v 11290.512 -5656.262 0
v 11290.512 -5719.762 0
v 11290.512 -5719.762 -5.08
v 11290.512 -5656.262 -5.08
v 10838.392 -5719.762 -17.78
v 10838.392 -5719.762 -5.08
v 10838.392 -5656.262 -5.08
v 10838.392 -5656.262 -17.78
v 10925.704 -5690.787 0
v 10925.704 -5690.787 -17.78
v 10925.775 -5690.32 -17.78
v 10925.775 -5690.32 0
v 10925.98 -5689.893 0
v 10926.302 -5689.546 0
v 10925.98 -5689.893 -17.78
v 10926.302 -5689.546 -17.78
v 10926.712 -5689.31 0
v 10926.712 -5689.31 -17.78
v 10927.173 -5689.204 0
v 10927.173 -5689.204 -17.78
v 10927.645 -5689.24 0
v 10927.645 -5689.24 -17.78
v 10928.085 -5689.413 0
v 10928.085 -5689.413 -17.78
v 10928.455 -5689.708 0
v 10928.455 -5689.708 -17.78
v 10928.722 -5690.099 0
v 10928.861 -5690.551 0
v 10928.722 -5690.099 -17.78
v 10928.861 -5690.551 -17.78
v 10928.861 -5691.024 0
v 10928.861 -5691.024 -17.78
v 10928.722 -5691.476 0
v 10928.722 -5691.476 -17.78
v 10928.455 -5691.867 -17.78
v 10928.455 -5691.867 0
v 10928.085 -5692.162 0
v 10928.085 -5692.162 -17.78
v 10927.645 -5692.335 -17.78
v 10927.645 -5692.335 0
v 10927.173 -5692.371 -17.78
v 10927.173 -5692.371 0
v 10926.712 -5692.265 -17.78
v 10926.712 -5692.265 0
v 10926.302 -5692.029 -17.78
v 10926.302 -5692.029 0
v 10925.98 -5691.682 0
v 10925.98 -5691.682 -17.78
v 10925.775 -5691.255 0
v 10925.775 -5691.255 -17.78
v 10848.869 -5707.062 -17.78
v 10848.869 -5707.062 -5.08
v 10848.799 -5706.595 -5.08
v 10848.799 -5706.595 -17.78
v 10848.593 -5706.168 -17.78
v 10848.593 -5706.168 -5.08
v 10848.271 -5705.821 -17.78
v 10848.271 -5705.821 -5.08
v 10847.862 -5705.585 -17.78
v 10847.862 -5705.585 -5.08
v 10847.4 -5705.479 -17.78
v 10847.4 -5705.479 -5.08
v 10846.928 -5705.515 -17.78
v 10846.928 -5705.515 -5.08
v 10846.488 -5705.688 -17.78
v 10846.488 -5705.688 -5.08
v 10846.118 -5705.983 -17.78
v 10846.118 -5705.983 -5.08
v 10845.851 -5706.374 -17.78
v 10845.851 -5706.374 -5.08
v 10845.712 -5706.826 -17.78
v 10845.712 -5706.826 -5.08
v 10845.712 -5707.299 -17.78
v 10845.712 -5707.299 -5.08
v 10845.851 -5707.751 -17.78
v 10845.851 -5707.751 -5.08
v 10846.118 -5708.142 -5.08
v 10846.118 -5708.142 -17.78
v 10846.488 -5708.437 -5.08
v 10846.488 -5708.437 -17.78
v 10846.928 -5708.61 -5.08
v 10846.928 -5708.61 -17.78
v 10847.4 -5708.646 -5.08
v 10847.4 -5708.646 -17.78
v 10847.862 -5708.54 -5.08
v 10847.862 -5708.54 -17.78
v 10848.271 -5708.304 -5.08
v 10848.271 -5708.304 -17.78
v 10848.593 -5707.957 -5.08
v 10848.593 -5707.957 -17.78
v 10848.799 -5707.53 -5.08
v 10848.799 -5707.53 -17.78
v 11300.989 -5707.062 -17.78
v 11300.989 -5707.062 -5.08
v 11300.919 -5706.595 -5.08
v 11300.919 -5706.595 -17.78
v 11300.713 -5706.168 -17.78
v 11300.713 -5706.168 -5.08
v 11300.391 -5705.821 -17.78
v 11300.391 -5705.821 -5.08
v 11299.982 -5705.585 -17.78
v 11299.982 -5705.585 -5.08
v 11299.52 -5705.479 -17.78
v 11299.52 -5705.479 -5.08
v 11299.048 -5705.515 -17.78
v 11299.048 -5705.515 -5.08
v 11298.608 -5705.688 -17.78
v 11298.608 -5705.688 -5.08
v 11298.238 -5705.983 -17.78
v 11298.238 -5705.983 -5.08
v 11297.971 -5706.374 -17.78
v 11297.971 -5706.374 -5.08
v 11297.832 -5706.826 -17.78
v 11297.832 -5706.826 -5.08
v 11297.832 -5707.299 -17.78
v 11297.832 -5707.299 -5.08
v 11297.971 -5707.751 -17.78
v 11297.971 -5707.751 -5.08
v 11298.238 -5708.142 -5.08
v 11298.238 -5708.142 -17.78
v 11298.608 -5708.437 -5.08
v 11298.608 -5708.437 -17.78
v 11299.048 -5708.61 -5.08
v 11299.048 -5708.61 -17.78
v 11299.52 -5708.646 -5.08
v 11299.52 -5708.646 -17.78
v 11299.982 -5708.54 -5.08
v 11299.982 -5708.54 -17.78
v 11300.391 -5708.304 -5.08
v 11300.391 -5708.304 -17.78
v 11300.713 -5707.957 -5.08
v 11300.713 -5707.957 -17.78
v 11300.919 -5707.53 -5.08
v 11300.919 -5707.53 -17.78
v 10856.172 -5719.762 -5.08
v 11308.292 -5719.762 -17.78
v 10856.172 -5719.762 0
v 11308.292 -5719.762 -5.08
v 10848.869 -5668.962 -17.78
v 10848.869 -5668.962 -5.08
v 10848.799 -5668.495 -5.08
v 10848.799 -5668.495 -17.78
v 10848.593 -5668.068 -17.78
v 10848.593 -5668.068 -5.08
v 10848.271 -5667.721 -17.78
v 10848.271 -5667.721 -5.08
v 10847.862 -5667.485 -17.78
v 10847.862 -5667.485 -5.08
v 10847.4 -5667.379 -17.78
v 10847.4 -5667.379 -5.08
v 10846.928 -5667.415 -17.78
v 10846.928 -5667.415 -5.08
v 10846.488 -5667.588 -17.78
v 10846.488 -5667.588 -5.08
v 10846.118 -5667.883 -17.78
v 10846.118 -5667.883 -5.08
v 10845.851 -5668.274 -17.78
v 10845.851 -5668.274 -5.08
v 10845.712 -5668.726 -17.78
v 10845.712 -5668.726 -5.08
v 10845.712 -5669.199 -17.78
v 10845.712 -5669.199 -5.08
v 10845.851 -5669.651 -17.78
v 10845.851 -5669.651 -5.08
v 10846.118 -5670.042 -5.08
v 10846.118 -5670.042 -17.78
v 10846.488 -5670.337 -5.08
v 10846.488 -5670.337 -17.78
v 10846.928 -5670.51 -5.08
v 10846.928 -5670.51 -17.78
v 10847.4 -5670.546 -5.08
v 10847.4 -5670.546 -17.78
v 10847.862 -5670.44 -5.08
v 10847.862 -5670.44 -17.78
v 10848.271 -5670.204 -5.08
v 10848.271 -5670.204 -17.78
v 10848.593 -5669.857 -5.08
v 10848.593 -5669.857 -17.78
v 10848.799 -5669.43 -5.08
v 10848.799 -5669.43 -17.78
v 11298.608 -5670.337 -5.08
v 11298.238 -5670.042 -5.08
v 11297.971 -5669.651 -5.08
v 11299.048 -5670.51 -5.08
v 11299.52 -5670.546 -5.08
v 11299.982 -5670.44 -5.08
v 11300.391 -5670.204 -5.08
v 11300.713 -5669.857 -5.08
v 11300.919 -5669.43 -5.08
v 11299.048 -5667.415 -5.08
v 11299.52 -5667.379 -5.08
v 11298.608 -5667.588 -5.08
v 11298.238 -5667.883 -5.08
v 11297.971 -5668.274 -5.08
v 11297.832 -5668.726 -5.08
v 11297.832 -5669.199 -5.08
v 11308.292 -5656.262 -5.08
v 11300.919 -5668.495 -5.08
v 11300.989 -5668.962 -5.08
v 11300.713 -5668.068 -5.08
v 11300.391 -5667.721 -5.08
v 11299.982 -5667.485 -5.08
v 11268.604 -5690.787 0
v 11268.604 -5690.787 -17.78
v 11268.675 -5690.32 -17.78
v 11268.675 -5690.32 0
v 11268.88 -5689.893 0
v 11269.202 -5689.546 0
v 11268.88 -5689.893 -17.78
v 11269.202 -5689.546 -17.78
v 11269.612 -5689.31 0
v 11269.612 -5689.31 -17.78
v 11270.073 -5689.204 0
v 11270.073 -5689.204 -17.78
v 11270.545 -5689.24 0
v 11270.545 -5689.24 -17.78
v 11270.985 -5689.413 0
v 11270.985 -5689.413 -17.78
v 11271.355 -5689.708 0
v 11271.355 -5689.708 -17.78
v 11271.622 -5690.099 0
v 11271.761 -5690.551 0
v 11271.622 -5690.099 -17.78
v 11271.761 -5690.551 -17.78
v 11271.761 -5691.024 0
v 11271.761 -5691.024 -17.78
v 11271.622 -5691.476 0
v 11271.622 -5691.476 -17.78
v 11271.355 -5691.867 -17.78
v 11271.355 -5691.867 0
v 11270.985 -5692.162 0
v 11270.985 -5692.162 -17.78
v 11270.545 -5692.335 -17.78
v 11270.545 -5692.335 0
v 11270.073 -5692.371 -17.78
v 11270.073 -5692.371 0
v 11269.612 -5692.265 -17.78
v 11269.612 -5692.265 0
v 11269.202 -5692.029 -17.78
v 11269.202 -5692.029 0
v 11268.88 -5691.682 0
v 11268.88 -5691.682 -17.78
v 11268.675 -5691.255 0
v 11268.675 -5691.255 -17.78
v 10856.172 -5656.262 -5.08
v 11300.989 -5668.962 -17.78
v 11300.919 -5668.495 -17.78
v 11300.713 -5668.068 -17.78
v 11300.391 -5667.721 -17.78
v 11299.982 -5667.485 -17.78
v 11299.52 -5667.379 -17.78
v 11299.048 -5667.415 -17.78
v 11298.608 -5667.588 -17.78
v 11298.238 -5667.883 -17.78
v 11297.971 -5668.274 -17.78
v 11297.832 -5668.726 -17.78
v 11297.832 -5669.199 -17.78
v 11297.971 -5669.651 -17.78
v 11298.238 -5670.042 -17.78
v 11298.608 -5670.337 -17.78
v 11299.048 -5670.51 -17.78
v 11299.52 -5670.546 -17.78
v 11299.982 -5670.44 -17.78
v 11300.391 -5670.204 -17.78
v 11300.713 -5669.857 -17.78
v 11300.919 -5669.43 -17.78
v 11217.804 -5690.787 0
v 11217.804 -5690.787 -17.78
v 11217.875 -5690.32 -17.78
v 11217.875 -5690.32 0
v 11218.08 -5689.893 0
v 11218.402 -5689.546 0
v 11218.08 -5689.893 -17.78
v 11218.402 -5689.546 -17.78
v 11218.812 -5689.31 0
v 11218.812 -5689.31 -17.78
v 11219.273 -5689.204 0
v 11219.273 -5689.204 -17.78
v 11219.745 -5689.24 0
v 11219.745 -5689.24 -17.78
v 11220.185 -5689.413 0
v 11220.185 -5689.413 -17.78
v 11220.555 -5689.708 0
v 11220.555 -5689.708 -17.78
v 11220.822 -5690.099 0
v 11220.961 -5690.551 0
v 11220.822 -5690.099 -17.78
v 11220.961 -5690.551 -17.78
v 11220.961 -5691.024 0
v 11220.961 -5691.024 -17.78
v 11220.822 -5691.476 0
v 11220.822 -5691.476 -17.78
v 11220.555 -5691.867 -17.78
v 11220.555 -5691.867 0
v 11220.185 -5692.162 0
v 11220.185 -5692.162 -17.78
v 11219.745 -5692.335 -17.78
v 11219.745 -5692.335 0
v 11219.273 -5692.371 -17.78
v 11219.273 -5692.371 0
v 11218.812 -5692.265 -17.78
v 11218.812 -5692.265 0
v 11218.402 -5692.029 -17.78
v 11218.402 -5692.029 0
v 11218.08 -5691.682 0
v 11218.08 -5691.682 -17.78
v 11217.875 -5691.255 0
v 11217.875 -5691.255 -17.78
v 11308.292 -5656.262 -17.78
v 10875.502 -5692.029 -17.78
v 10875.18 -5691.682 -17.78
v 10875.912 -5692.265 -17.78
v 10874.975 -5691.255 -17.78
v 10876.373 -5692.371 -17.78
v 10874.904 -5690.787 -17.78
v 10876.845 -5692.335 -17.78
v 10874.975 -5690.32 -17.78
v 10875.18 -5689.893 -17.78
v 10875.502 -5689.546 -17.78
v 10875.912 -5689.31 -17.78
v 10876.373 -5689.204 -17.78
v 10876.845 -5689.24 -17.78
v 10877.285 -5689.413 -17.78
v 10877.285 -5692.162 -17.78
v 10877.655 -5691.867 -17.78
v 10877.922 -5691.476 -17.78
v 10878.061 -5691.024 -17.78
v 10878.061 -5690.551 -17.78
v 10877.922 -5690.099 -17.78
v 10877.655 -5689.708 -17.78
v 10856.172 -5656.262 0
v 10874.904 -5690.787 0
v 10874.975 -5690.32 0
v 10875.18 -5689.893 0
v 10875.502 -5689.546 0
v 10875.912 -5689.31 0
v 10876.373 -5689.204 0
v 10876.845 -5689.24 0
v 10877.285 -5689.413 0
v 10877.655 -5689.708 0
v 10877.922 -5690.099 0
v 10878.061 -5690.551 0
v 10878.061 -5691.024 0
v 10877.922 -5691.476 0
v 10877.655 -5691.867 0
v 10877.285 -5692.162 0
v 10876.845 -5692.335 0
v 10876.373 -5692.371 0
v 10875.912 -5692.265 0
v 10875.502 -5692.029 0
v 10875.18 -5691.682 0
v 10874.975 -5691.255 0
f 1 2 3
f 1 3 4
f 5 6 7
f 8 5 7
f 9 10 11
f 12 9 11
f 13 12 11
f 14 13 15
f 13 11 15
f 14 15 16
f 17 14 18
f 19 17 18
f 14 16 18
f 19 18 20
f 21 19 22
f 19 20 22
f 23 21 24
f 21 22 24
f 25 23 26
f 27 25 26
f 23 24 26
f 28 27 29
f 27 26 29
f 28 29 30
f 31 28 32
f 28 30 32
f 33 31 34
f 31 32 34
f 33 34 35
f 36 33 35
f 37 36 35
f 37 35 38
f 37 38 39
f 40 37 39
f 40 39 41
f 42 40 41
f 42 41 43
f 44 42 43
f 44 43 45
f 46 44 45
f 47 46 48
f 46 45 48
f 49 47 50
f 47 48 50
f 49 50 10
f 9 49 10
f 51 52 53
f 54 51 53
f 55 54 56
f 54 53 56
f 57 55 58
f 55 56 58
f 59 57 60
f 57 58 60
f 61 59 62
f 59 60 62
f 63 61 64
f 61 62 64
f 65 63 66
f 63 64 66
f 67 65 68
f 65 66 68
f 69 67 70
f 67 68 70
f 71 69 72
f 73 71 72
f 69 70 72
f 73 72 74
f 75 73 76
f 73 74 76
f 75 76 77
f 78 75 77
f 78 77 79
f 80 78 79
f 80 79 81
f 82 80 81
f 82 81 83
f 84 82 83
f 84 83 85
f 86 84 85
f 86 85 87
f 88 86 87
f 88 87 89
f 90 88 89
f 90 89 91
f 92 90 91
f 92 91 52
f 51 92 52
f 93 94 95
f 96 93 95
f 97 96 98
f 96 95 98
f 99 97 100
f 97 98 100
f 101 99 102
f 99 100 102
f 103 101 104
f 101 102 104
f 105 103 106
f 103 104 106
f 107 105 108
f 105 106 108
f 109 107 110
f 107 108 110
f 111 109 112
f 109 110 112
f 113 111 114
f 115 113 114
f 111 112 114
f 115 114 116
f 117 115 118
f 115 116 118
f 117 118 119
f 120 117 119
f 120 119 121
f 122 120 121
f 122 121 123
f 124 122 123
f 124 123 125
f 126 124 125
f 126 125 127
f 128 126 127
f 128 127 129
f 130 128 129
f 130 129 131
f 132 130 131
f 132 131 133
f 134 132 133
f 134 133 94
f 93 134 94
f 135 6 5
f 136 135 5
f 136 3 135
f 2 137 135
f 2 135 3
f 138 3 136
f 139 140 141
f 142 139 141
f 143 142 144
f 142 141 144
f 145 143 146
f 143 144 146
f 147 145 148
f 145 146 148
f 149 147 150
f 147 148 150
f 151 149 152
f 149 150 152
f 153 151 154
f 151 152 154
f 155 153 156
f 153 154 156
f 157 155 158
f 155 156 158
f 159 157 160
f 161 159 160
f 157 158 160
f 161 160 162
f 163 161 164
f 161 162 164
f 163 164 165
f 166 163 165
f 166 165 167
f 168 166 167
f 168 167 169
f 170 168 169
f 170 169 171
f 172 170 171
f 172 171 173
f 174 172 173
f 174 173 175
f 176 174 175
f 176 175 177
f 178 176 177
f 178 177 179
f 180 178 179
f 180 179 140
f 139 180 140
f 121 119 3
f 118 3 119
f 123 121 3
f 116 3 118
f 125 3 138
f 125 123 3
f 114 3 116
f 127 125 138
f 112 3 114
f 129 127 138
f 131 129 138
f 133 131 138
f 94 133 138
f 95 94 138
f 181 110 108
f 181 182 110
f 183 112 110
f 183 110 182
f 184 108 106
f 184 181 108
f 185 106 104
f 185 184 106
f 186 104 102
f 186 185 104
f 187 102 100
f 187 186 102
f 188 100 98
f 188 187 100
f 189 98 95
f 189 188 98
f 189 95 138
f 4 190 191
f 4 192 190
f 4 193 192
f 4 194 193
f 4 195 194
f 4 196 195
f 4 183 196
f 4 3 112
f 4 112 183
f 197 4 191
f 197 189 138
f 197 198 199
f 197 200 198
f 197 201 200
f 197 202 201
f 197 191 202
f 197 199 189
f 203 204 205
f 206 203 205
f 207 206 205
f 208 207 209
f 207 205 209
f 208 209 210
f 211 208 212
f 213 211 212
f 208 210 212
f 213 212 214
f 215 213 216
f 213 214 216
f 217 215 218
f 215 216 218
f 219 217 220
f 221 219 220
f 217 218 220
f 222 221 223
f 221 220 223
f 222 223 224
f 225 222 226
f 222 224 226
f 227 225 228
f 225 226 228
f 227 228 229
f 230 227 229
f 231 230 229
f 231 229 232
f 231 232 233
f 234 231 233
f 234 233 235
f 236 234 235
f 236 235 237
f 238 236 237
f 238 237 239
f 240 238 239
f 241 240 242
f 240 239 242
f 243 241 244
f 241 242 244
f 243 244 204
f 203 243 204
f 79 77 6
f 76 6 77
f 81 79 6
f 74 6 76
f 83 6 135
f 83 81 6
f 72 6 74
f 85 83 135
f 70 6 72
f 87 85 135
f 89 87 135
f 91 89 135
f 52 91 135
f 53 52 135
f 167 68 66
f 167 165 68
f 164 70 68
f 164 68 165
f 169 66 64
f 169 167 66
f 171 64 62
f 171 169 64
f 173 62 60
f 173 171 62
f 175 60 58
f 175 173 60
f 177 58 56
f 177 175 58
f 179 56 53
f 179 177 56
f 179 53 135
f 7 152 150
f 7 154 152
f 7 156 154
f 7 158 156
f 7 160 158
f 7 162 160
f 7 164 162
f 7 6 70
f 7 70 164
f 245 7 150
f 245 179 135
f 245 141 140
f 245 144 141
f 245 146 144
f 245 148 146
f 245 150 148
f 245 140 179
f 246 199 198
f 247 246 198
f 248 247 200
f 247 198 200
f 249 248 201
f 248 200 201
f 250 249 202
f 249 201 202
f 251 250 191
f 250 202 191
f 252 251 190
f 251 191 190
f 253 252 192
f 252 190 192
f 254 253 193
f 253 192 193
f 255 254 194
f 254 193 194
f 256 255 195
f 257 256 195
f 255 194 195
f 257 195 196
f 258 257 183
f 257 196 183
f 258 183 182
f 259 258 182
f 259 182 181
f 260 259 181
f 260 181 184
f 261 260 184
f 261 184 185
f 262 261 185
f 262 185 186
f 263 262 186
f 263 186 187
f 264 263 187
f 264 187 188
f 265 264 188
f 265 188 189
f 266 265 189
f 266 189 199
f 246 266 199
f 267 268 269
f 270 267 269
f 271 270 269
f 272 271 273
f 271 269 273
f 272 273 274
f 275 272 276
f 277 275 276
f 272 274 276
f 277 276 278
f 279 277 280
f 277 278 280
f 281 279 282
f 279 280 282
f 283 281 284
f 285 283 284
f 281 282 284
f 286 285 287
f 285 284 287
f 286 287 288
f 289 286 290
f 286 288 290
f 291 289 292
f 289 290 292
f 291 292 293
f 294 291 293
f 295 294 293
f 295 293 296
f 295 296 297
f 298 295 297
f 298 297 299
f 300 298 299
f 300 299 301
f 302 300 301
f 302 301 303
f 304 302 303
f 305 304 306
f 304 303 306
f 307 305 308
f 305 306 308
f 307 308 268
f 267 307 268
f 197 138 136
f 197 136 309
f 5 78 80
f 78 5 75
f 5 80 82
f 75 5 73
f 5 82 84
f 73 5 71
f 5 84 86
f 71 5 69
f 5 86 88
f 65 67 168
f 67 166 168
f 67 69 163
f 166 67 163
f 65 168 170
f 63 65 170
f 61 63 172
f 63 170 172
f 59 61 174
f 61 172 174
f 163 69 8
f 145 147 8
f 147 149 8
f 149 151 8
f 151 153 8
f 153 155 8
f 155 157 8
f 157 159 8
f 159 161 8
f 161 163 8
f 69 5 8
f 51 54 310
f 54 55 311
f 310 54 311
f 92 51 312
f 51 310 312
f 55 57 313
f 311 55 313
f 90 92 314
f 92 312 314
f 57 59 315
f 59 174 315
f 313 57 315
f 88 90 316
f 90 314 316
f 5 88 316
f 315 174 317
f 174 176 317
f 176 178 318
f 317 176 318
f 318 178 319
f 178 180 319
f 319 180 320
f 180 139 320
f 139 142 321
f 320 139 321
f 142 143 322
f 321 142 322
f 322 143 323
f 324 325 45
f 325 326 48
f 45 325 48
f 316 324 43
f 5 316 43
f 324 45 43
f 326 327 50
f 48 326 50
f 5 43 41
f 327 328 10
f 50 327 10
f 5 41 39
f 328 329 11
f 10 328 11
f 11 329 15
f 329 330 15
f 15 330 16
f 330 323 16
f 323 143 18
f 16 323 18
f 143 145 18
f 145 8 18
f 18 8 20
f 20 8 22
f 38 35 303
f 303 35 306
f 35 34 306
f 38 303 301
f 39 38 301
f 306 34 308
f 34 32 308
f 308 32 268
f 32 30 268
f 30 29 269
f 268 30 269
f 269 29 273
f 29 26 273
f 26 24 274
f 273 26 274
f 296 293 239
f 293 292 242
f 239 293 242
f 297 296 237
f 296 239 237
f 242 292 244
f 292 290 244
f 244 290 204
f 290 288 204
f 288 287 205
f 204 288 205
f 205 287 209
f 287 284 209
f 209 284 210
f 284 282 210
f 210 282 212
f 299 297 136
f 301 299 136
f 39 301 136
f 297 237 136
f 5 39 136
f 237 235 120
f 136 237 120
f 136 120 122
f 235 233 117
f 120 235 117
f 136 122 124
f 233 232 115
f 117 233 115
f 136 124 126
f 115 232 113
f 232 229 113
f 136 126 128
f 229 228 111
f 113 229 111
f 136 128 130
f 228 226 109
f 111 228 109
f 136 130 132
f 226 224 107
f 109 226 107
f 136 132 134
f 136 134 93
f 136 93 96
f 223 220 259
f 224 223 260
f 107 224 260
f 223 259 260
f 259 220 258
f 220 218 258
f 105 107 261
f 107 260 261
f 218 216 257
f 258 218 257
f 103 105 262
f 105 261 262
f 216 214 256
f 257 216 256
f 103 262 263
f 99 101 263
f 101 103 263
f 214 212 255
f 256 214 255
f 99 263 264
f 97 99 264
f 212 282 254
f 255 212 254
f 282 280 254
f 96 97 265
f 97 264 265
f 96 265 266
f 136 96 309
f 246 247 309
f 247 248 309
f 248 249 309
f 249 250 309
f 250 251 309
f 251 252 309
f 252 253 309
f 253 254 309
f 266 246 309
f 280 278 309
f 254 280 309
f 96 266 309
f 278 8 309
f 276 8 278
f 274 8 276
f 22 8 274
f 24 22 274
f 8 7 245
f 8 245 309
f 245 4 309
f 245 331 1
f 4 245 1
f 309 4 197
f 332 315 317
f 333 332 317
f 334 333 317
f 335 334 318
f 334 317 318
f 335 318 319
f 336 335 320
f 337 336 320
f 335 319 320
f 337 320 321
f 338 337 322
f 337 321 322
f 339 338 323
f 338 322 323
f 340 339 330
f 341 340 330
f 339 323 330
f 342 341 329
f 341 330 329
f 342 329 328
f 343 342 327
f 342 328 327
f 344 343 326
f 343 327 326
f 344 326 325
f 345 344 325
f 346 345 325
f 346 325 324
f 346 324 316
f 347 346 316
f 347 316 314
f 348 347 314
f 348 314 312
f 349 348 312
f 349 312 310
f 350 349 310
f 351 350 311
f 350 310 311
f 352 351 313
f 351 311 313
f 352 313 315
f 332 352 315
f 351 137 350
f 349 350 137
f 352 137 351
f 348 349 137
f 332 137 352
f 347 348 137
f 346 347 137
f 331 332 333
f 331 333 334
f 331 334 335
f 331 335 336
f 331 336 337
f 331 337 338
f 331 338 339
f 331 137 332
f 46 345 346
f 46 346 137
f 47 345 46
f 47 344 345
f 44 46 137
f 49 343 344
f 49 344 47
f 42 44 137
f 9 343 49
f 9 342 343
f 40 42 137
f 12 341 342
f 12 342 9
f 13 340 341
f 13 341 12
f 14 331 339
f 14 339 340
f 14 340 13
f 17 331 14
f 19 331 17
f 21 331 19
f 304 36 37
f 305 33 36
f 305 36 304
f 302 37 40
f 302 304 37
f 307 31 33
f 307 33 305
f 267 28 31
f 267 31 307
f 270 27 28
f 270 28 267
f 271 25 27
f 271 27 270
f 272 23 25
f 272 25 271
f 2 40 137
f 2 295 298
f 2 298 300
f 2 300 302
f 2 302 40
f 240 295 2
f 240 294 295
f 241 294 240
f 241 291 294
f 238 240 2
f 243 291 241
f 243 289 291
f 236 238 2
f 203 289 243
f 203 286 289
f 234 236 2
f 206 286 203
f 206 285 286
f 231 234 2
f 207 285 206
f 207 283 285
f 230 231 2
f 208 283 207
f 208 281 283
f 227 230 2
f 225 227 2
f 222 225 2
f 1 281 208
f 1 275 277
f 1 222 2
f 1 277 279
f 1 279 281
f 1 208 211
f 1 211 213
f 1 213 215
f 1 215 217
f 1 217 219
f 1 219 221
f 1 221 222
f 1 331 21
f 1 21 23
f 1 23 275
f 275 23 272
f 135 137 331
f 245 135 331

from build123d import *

# Parameters (mm, degrees)
SKETCH2_W          = 469.9
SKETCH2_H          = 63.5
EXTRUDE1_DEPTH     = 17.78
SKETCH3_W          = 17.78
SKETCH3_H          = 63.5
CUT_EXTRUDE1_DEPTH = 5.08
SKETCH4_R          = 1.5875
CUT_EXTRUDE2_DEPTH = 17.78
SKETCH5_R          = 1.5875
CUT_EXTRUDE3_DEPTH = 17.78


with BuildPart() as part:
    # Sketch2 → Extrude1 (new body)
    with BuildSketch(Plane.XY):
        with Locations((11073.341666666, -5688.0125)):
            Rectangle(SKETCH2_W, SKETCH2_H)
    extrude(amount=-EXTRUDE1_DEPTH)

    # Sketch3 → Cut-Extrude1 (cut)
    with BuildSketch(Plane.XY):
        with Locations((11299.401666666, -5688.0125)):
            Rectangle(SKETCH3_W, SKETCH3_H)
        with Locations((10847.281666666, -5688.0125)):
            Rectangle(SKETCH3_W, SKETCH3_H)
    extrude(amount=-CUT_EXTRUDE1_DEPTH, mode=Mode.SUBTRACT)

    # Sketch4 → Cut-Extrude2 (cut)
    with BuildSketch(Plane.XY):
        with Locations((10847.281666666, -5668.9625)):
            Circle(SKETCH4_R)
        with Locations((10847.281666666, -5707.0625)):
            Circle(SKETCH4_R)
        with Locations((11299.401666666, -5707.0625)):
            Circle(SKETCH4_R)
        with Locations((11299.401666666, -5668.9625)):
            Circle(SKETCH4_R)
    extrude(amount=-CUT_EXTRUDE2_DEPTH, mode=Mode.SUBTRACT)

    # Sketch5 → Cut-Extrude3 (cut)
    with BuildSketch(Plane(origin=(0, 0, -17.78), x_dir=(-1, 0, 0), z_dir=(0, 0, -1))):
        with Locations((-10876.491666666, -5690.78745)):
            Circle(SKETCH5_R)
        with Locations((-10927.291666666, -5690.78745)):
            Circle(SKETCH5_R)
        with Locations((-11219.391666666, -5690.78745)):
            Circle(SKETCH5_R)
        with Locations((-11270.191666666, -5690.78745)):
            Circle(SKETCH5_R)
    extrude(amount=-CUT_EXTRUDE3_DEPTH, mode=Mode.SUBTRACT)


solid = part.part
